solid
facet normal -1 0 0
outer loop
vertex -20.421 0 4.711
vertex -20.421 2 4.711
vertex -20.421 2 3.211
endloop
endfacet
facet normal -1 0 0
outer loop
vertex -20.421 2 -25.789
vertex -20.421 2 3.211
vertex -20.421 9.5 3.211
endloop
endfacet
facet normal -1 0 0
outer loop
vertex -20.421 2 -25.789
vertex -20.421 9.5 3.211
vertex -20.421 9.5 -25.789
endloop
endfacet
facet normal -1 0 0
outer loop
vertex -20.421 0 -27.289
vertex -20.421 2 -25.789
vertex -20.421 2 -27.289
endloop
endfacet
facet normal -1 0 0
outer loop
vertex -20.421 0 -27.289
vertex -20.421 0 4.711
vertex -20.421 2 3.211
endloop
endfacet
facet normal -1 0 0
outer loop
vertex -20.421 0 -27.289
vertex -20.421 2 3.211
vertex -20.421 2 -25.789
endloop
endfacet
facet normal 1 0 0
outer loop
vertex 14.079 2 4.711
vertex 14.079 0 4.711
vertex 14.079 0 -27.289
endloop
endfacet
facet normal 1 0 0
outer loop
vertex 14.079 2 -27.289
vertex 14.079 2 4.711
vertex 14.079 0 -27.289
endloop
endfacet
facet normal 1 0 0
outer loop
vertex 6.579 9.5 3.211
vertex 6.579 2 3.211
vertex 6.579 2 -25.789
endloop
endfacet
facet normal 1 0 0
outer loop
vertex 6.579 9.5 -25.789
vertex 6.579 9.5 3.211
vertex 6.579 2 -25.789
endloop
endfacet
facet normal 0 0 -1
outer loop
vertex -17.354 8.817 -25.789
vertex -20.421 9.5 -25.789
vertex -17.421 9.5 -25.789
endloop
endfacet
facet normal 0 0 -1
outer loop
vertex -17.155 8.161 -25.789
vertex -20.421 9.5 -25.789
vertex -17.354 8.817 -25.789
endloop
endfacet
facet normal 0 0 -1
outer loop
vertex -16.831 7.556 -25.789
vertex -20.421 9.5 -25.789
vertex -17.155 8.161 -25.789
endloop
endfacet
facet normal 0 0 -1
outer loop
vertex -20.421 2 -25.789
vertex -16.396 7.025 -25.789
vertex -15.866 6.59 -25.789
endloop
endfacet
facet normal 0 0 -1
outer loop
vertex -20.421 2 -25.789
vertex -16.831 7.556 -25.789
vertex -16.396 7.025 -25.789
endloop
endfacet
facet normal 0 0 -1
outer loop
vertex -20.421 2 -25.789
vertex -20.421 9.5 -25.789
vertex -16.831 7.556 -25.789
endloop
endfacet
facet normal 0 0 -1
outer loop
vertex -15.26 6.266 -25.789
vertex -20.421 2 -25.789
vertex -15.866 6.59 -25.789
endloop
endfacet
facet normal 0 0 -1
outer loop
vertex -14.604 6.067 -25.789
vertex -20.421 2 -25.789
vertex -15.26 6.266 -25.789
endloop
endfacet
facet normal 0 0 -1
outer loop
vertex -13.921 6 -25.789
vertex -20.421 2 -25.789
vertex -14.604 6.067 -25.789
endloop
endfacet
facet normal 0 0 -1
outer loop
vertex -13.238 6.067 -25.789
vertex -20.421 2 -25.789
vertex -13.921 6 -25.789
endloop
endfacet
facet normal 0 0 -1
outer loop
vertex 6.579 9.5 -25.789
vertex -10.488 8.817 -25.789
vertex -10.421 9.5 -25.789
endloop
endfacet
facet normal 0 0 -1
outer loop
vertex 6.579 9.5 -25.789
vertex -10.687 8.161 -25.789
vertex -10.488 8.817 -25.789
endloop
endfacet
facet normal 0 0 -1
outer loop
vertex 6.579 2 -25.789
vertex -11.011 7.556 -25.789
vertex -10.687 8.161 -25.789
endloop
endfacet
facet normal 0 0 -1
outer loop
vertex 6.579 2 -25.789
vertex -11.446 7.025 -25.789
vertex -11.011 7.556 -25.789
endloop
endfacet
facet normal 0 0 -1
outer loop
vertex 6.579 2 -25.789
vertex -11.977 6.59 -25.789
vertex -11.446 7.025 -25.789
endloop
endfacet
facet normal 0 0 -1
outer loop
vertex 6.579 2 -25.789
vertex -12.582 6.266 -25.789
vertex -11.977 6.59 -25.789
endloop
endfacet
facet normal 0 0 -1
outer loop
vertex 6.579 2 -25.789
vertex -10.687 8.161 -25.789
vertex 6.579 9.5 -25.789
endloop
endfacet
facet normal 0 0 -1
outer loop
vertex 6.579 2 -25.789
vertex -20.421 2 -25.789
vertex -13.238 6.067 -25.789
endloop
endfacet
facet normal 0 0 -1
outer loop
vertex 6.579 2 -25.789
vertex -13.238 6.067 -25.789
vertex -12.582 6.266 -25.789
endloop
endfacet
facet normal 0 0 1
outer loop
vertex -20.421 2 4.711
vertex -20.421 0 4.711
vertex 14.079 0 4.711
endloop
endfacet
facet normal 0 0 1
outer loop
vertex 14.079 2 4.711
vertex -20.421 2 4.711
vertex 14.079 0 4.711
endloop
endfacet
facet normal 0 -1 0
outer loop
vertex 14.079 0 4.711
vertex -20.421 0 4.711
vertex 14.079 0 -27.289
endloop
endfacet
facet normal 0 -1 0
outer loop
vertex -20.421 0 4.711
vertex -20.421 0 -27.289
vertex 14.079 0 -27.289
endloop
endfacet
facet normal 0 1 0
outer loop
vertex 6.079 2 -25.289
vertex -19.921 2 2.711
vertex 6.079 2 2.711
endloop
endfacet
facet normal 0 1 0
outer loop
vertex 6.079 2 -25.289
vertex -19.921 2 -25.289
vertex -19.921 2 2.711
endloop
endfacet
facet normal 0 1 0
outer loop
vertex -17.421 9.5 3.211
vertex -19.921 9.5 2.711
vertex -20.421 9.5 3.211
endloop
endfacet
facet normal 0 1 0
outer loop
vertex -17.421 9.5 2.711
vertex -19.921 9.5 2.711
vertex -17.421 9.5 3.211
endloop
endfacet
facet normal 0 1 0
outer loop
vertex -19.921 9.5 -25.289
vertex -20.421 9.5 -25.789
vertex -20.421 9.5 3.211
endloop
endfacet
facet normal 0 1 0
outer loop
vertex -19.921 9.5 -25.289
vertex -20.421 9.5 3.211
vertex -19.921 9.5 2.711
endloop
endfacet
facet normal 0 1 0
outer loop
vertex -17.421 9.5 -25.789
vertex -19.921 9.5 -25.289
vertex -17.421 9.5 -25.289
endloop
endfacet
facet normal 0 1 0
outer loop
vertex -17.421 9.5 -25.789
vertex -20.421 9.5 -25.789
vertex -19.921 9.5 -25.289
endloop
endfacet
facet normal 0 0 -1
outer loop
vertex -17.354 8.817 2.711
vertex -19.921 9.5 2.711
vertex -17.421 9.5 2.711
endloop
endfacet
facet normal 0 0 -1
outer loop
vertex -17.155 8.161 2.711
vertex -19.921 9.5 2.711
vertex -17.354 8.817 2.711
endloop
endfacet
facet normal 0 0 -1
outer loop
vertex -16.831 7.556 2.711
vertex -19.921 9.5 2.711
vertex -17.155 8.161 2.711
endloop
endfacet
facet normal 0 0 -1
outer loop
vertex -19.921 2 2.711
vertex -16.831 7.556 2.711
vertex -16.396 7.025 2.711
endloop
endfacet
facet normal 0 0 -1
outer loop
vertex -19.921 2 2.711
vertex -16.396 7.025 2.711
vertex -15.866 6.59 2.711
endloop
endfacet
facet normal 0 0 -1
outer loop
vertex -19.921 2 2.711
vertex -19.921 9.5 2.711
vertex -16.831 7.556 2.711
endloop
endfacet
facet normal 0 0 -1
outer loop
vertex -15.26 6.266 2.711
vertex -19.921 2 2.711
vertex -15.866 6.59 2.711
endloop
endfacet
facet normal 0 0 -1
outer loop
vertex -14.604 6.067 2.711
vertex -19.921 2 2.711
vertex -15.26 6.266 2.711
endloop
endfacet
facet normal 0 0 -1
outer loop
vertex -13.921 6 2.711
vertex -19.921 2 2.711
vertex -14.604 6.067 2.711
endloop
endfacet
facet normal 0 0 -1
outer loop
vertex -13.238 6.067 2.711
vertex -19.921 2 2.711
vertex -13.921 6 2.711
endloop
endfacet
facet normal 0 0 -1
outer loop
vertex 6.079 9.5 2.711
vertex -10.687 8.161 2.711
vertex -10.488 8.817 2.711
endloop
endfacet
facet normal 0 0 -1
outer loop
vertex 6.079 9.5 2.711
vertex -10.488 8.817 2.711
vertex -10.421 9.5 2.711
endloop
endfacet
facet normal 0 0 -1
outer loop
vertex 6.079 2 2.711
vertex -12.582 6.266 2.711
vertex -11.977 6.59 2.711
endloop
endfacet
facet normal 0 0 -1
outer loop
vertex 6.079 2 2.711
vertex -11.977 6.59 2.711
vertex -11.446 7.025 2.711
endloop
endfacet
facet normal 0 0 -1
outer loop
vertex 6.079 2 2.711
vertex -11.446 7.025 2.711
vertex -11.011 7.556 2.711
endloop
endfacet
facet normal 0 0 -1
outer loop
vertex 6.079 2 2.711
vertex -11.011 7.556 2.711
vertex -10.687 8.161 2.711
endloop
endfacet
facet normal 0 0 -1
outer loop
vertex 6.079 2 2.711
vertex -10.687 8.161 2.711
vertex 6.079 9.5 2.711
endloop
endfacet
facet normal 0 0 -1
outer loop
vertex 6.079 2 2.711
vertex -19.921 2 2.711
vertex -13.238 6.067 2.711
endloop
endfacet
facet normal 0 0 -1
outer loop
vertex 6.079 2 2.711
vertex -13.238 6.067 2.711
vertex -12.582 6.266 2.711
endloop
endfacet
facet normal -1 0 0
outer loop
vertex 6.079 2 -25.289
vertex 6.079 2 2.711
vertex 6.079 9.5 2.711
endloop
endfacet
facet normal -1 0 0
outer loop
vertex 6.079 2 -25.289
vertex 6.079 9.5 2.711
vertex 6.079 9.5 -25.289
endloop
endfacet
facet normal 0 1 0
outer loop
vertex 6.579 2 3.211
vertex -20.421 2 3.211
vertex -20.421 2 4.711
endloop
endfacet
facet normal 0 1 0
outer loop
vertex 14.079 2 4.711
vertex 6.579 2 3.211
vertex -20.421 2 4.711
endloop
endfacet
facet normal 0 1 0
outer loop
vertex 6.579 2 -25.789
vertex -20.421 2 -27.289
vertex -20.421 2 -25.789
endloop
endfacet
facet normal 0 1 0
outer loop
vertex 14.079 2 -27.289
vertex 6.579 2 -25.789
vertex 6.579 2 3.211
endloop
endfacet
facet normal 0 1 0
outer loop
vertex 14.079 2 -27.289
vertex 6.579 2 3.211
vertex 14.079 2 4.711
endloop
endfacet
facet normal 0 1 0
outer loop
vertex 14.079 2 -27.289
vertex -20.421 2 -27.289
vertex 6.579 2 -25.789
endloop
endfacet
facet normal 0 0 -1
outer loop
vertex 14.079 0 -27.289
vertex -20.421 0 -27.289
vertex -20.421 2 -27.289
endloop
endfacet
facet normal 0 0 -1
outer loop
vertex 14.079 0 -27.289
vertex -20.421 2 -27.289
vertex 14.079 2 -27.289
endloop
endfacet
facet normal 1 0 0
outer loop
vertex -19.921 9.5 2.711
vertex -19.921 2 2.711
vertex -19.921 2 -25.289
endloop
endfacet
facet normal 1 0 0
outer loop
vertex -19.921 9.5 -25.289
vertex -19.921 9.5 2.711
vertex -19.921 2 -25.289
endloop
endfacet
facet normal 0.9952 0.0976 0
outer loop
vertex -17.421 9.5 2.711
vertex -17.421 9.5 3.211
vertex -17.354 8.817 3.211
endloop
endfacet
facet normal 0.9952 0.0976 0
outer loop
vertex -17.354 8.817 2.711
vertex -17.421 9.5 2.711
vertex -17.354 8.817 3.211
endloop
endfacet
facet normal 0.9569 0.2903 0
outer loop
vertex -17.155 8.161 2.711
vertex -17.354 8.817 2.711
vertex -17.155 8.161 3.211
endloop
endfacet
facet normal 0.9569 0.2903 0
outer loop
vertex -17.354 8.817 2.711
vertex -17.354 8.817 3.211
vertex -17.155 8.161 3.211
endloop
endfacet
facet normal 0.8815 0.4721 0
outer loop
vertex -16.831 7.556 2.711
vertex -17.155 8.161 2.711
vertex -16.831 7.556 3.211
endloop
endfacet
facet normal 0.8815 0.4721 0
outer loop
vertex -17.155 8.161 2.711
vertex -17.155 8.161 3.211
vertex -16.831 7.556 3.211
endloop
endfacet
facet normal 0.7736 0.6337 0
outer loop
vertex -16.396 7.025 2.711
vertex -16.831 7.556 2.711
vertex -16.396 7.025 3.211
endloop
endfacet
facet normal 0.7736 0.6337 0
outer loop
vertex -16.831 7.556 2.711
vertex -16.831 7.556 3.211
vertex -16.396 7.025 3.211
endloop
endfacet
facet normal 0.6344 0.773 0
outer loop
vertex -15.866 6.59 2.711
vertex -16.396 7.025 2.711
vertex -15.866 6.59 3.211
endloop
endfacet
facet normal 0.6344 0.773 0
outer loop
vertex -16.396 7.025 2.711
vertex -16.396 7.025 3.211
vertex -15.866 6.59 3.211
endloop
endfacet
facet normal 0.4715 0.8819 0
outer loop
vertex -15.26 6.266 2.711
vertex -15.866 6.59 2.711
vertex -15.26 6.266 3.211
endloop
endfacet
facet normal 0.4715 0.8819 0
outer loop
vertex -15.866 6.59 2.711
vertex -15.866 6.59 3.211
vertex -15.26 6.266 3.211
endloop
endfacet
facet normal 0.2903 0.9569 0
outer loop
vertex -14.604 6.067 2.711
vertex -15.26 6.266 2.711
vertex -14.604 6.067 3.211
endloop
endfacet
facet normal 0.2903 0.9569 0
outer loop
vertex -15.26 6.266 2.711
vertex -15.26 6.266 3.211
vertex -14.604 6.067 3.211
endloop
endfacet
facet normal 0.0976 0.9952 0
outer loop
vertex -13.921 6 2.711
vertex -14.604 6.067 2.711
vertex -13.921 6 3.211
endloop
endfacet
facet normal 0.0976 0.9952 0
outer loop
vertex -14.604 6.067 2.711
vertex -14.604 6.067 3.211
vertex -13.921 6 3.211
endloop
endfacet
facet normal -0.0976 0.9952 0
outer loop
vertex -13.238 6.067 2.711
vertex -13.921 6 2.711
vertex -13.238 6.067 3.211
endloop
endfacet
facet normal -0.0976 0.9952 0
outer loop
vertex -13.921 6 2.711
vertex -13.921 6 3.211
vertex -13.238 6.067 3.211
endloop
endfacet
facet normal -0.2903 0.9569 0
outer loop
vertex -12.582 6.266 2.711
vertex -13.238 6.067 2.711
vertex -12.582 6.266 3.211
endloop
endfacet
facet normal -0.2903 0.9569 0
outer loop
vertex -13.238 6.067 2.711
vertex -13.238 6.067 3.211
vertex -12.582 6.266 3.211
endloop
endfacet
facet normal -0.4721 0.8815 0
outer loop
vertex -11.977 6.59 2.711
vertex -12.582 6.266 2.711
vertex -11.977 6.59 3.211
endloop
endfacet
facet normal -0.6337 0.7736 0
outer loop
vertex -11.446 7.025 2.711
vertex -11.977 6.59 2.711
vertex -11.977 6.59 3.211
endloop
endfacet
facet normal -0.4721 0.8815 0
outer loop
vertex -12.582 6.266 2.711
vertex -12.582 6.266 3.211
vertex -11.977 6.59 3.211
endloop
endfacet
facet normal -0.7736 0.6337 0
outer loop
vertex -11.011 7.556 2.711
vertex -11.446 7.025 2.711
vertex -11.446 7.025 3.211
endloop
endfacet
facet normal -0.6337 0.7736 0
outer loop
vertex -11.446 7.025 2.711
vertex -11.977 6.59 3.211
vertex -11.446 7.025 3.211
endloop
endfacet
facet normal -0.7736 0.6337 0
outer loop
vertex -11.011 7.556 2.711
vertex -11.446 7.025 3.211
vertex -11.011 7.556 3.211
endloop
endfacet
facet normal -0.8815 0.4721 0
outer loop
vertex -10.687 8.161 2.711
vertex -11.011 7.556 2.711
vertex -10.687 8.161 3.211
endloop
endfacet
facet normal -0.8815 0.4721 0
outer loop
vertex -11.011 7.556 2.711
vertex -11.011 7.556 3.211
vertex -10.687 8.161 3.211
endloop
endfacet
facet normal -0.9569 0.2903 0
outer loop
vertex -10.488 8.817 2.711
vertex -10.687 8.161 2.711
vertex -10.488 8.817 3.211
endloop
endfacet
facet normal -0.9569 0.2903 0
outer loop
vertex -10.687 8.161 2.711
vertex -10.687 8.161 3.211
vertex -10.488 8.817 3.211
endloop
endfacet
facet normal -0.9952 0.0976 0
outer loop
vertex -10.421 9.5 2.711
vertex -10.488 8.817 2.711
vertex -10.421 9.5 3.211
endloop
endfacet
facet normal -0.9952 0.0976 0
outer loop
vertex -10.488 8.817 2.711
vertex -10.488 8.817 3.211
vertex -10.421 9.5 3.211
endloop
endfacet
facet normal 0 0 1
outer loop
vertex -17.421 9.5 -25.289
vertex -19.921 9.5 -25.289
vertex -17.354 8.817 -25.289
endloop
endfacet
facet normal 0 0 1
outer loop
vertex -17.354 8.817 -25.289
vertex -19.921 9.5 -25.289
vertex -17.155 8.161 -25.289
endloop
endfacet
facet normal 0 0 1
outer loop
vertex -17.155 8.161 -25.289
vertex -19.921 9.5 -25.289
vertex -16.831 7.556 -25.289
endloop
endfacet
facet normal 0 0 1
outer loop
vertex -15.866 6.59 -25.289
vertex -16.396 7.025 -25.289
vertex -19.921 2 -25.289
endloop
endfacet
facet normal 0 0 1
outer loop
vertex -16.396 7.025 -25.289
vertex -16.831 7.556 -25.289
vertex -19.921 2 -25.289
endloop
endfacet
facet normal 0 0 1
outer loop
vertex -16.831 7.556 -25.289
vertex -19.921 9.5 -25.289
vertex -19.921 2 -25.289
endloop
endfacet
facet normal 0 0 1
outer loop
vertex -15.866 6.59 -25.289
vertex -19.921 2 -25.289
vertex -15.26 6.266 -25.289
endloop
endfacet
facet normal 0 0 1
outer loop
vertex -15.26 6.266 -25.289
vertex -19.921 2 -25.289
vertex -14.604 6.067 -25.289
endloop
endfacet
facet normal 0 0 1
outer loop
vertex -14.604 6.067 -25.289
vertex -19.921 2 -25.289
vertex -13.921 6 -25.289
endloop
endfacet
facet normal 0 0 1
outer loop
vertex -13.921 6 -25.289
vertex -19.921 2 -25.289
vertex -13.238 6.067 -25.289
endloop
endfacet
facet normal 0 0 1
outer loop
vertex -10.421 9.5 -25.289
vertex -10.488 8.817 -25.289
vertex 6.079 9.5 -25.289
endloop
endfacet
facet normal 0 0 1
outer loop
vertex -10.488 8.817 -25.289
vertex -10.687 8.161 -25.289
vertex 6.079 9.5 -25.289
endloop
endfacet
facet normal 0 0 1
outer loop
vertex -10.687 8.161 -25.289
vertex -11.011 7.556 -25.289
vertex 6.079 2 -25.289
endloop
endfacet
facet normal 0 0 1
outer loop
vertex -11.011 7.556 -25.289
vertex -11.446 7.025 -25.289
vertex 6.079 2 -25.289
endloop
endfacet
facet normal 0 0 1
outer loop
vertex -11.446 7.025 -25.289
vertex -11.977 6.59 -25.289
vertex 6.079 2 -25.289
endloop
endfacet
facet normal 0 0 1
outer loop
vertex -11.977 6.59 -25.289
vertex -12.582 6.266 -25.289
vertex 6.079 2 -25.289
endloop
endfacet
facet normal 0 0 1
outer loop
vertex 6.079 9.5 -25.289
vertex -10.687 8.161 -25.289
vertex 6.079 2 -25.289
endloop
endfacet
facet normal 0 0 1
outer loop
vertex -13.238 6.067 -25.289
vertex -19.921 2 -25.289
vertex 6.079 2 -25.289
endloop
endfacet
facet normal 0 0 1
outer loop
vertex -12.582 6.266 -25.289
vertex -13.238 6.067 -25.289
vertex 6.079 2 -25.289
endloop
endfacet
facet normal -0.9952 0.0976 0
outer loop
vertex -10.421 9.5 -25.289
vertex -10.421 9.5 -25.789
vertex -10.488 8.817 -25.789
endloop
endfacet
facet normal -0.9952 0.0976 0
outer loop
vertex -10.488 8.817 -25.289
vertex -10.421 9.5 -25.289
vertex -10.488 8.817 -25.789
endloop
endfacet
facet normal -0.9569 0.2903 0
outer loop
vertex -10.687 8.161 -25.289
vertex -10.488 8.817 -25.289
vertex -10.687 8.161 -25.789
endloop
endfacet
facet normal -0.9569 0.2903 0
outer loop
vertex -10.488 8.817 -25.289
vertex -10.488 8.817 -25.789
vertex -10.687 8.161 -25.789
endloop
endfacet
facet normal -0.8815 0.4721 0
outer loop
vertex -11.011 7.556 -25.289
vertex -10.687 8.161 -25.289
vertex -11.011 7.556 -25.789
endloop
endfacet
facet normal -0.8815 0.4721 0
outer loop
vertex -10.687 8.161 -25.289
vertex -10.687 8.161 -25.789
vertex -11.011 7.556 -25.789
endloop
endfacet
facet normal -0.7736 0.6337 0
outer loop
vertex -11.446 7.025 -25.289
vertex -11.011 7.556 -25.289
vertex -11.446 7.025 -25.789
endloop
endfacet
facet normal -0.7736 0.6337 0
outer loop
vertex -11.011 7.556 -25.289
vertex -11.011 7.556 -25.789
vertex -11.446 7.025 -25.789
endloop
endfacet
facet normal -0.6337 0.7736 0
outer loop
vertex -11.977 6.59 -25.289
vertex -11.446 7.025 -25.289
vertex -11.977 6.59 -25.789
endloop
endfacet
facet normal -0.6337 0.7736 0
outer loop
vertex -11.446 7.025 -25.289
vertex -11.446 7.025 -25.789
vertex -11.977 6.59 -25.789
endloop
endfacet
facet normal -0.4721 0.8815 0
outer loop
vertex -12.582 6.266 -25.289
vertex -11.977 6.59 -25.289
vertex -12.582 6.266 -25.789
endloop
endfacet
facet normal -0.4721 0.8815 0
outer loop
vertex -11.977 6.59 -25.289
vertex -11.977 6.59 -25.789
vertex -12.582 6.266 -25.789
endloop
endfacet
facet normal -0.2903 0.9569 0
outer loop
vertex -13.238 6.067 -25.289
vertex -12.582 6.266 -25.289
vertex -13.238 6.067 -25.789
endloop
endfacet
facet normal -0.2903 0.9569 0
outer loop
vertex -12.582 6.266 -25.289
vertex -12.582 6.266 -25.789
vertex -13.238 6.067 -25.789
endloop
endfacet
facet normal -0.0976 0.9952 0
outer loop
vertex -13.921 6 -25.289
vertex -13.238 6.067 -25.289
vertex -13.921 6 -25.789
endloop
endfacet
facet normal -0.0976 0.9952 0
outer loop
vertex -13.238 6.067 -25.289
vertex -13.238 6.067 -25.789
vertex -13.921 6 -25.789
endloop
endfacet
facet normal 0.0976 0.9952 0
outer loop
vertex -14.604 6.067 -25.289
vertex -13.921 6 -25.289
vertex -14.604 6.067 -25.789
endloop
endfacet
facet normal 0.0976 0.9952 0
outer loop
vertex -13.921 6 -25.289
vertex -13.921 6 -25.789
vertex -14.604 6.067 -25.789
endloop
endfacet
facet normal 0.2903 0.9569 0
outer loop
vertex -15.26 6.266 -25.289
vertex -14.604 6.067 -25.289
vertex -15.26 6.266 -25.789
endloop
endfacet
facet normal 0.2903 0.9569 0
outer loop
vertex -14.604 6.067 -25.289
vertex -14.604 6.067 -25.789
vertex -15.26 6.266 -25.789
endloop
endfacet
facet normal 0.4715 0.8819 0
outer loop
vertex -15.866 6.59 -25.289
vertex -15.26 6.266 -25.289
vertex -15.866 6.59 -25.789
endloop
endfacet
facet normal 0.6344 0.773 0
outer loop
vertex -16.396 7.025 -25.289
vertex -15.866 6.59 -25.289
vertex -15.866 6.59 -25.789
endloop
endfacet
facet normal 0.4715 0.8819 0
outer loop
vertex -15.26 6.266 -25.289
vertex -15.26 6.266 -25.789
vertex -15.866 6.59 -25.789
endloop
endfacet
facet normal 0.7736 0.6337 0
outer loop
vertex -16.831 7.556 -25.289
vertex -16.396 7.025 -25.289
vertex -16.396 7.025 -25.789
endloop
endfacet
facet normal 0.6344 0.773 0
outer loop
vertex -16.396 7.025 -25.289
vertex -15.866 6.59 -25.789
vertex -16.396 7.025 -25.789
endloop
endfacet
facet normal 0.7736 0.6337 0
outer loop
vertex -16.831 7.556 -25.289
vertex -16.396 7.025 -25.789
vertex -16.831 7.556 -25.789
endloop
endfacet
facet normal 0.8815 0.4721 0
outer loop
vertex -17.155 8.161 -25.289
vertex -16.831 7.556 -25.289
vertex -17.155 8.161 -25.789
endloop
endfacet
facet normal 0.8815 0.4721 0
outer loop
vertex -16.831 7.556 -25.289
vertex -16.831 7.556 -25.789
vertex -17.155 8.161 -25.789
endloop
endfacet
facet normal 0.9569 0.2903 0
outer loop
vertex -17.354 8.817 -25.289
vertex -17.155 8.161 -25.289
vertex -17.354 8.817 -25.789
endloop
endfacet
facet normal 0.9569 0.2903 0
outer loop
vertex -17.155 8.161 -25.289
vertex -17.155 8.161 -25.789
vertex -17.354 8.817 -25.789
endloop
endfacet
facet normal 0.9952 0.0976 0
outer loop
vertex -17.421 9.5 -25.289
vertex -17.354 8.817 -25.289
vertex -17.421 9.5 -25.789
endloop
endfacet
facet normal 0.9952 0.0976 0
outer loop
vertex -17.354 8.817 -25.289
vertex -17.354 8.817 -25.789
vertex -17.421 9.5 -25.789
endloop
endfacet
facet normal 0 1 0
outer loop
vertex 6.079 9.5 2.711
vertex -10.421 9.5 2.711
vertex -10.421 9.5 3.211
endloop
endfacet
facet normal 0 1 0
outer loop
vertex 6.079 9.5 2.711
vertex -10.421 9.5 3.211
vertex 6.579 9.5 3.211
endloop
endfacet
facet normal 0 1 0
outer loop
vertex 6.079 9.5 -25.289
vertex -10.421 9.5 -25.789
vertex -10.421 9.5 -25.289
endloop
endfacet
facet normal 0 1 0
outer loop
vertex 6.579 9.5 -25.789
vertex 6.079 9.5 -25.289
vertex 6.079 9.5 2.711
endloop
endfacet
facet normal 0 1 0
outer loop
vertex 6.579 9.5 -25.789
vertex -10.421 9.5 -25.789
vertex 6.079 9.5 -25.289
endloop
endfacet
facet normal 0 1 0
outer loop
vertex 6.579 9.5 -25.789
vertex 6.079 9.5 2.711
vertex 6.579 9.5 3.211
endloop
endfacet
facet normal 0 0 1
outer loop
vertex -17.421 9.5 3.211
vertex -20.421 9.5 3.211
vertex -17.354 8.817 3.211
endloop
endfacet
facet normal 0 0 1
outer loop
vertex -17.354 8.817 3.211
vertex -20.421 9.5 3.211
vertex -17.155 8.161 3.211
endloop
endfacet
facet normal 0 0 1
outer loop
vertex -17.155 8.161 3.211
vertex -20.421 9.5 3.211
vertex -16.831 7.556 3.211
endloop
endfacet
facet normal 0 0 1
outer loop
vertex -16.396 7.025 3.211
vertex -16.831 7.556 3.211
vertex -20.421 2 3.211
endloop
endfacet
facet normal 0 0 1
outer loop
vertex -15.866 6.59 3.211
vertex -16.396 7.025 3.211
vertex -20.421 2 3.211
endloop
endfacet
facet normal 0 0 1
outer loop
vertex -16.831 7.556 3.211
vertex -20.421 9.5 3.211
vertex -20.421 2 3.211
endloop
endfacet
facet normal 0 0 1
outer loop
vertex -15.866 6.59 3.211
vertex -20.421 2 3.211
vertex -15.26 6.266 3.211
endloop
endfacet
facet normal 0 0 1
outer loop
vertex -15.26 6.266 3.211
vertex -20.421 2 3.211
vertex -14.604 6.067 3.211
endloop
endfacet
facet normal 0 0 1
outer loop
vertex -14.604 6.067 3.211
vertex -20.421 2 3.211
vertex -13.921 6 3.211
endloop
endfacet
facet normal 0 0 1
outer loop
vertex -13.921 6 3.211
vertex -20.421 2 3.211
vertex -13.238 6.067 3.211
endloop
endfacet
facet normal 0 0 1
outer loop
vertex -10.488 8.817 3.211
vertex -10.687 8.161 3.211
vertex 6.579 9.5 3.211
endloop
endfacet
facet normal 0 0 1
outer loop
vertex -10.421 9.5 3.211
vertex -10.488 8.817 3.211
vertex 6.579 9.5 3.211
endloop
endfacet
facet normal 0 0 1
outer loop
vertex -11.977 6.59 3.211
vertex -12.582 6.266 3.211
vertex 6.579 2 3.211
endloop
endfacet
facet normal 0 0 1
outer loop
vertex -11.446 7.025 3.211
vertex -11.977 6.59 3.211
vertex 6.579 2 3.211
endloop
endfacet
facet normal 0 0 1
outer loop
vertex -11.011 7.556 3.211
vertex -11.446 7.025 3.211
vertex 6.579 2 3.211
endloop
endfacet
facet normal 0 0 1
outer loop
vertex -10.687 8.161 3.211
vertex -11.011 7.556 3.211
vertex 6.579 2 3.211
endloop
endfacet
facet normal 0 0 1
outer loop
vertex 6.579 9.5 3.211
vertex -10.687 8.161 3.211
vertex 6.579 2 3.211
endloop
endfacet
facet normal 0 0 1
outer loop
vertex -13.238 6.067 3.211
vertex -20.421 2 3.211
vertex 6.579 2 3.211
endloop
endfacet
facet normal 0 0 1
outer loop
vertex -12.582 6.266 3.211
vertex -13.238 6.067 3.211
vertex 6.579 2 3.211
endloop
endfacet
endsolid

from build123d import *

# Parameters (mm, degrees)
ESQUISSE1_W             = 34.5
ESQUISSE1_H             = 32
BOSS_EXTRU_1_DEPTH      = 2
ESQUISSE1_4_W           = 27
ESQUISSE1_4_H           = 29
ESQUISSE1_4_W_2         = 26
ESQUISSE1_4_H_2         = 28
BOSS_EXTRU_2_DEPTH      = 9.5
ESQUISSE6_R             = 3.5
ENL_V_MAT_EXTRU_2_DEPTH = 0.5
ENL_V_START             = -0.5
ESQUISSE5_R             = 3.5
ENL_V_MAT_EXTRU_3_DEPTH = 0.5


with BuildPart() as part:
    # Esquisse1 → Boss.-Extru.1 (new body)
    with BuildSketch(Plane(origin=(0, 0, 0), x_dir=(1, 0, 0), z_dir=(0, 1, 0))):
        with Locations((-3.171052632, 11.289473684)):
            Rectangle(ESQUISSE1_W, ESQUISSE1_H)
    extrude(amount=BOSS_EXTRU_1_DEPTH)

    # Esquisse1<4> → Boss.-Extru.2 (add)
    with BuildSketch(Plane(origin=(0, 0, 0), x_dir=(1, 0, 0), z_dir=(0, 1, 0))):
        with Locations((-6.921052632, 11.289473684)):
            Rectangle(ESQUISSE1_4_W, ESQUISSE1_4_H)
        with Locations((-6.921052632, 11.289473684)):
            Rectangle(ESQUISSE1_4_W_2, ESQUISSE1_4_H_2, mode=Mode.SUBTRACT)
    extrude(amount=BOSS_EXTRU_2_DEPTH)

    # Esquisse6 → Enlèv. mat.-Extru.2 (cut)
    with BuildSketch(Plane.XY.offset(3.210526316)):
        with Locations((-13.921052632, 9.5)):
            Circle(ESQUISSE6_R)
    extrude(amount=-ENL_V_MAT_EXTRU_2_DEPTH, mode=Mode.SUBTRACT)

    # Esquisse5 → Enlèv. mat.-Extru.3 (cut)
    with BuildSketch(Plane(origin=(0, 0, -25.789473684), x_dir=(-1, 0, 0), z_dir=(0, 0, -1)).offset(ENL_V_START)):
        with Locations((13.921052632, 9.5)):
            Circle(ESQUISSE5_R)
    extrude(amount=ENL_V_MAT_EXTRU_3_DEPTH, mode=Mode.SUBTRACT)


solid = part.part
